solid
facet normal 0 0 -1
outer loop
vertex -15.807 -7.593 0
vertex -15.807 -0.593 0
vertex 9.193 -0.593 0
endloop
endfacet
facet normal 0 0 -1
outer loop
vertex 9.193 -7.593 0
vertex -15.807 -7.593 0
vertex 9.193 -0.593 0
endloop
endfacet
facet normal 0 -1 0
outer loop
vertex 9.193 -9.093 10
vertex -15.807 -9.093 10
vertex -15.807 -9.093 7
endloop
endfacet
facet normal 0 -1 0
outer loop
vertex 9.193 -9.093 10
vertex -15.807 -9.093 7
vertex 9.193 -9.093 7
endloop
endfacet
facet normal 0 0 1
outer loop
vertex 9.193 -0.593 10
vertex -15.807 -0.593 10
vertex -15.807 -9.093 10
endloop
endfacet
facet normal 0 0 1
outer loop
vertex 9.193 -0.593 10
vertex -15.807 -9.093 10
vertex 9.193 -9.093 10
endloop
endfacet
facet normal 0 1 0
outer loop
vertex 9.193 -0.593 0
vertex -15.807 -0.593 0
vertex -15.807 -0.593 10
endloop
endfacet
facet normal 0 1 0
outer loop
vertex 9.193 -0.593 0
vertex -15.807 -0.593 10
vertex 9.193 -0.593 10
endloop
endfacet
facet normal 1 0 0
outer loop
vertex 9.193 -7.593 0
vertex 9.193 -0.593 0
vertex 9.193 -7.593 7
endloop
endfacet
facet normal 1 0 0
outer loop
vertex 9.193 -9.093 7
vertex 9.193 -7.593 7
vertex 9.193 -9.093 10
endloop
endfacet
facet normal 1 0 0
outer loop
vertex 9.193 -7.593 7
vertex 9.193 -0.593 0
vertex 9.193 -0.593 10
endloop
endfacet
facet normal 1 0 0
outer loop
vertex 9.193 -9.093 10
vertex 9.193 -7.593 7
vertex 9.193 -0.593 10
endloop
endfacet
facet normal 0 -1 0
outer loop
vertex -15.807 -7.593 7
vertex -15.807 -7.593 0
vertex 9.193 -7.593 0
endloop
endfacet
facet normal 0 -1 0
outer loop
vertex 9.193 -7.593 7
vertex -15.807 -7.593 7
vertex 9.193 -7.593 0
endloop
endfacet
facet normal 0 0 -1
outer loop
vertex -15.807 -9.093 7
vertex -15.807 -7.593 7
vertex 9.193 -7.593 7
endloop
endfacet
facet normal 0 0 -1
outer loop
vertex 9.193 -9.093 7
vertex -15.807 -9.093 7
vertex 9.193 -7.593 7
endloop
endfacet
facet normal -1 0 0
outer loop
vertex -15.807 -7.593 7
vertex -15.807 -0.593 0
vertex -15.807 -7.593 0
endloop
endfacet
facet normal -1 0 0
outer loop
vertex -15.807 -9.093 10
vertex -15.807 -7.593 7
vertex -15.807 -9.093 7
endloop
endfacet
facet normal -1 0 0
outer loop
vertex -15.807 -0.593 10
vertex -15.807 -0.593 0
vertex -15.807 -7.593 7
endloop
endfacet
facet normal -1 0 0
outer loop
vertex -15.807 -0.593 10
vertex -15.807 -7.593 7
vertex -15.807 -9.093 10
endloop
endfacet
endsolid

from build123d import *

# Parameters (mm, degrees)
ESQUISSE1_W        = 25
ESQUISSE1_H        = 7
BOSS_EXTRU_1_DEPTH = 10
ESQUISSE2_W        = 25
ESQUISSE2_H        = 3
BOSS_EXTRU_2_DEPTH = 1.5


with BuildPart() as part:
    # Esquisse1 → Boss.-Extru.1 (new body)
    with BuildSketch(Plane.XY):
        with Locations((-3.307033874, -4.093457944)):
            Rectangle(ESQUISSE1_W, ESQUISSE1_H)
    extrude(amount=BOSS_EXTRU_1_DEPTH)

    # Esquisse2 → Boss.-Extru.2 (add)
    with BuildSketch(Plane.XZ.offset(7.593457944)):
        with Locations((-3.307033874, 8.5)):
            Rectangle(ESQUISSE2_W, ESQUISSE2_H)
    extrude(amount=BOSS_EXTRU_2_DEPTH)


solid = part.part
